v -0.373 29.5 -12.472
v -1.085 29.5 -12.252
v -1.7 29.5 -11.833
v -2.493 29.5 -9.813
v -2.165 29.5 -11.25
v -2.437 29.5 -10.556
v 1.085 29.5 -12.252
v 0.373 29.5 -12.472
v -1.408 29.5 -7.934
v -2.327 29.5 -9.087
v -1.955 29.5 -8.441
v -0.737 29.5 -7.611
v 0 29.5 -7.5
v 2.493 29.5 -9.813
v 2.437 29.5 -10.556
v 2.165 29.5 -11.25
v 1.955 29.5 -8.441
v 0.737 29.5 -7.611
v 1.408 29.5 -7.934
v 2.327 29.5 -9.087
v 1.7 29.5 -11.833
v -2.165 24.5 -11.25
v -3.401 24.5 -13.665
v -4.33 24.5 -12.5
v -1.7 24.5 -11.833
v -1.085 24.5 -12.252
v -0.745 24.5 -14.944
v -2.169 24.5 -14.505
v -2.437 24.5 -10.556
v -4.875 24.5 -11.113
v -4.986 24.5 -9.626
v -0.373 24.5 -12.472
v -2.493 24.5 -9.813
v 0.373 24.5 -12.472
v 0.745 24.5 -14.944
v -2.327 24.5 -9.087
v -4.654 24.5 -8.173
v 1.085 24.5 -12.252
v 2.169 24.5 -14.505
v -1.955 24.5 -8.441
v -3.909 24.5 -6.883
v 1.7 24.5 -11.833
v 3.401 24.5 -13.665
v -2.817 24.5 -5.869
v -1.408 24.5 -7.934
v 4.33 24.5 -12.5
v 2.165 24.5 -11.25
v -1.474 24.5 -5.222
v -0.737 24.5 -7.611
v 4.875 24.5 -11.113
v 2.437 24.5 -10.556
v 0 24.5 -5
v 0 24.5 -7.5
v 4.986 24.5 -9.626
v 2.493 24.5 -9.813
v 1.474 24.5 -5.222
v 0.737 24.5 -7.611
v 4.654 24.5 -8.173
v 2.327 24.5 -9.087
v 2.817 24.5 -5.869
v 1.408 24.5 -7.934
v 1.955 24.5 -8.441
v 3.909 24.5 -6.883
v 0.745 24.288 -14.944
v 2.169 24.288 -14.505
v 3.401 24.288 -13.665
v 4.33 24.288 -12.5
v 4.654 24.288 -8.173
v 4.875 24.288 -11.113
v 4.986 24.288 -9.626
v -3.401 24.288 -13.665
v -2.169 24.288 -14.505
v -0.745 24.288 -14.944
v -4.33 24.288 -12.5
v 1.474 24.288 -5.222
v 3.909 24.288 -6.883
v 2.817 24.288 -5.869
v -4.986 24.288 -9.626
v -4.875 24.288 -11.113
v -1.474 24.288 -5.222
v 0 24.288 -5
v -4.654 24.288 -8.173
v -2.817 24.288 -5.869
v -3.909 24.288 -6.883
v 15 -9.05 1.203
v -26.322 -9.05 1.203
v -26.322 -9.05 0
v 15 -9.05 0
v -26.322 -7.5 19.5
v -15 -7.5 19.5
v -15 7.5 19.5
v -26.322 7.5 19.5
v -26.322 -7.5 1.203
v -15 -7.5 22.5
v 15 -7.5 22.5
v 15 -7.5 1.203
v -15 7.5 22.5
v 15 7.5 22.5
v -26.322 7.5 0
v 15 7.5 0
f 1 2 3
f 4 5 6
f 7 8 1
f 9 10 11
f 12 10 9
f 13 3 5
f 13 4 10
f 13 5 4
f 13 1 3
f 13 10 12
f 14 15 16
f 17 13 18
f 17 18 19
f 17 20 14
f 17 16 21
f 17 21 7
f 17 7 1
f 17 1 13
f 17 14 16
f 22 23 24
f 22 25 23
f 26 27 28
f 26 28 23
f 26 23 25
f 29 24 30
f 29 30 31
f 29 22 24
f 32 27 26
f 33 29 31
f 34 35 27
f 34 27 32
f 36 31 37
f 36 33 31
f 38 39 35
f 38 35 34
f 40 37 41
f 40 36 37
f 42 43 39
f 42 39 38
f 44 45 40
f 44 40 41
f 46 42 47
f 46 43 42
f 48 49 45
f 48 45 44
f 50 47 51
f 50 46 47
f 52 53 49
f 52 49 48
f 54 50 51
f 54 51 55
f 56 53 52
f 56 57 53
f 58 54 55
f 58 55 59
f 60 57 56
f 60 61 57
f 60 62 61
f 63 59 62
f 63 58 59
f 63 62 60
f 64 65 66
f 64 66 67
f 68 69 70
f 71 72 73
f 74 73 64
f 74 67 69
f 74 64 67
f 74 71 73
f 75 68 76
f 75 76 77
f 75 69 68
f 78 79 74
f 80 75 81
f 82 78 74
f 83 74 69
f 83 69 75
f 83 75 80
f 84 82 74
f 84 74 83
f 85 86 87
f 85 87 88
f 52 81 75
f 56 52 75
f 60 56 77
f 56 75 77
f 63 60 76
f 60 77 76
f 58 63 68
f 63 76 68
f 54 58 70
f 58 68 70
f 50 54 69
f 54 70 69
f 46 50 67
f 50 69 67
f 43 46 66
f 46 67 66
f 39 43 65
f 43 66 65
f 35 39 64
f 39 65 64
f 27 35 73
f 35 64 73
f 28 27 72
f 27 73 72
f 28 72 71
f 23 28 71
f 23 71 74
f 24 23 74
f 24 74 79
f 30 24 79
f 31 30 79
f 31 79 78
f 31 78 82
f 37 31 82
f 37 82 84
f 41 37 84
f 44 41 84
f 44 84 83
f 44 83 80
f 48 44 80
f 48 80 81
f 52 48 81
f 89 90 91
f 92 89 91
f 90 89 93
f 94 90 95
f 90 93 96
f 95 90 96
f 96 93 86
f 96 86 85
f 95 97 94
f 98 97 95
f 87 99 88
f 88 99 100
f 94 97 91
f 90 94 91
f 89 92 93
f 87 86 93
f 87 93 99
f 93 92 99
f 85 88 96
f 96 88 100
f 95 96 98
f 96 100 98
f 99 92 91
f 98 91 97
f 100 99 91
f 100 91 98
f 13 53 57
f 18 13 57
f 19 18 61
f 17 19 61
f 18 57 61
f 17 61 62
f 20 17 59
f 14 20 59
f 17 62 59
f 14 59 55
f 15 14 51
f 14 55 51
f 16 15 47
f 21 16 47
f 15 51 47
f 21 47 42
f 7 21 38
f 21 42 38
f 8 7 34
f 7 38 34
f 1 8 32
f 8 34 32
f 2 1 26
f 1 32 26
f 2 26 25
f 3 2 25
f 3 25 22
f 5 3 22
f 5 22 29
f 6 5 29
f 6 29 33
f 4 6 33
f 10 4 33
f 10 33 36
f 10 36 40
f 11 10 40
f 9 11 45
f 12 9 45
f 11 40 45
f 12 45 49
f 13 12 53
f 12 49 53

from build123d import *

# Parameters (mm, degrees)
CROQUIS1_W              = 30
CROQUIS1_H              = 45
SALIENTE_EXTRUIR1_DEPTH = 7.5
CROQUIS2_W              = 20
CROQUIS2_H              = 15
SALIENTE_EXTRUIR2_DEPTH = 15
CROQUIS3_W              = 20
CROQUIS3_H              = 15
SALIENTE_EXTRUIR3_DEPTH = 8
CROQUIS4_R              = 5
SALIENTE_EXTRUIR4_DEPTH = 2
CROQUIS5_R              = 2.5
SALIENTE_EXTRUIR5_DEPTH = 5
CROQUIS6_W              = 19.5
CROQUIS6_H              = 15
SALIENTE_EXTRUIR6_DEPTH = 16
CROQUIS7_W              = 46
CROQUIS7_H              = 1.203222492
SALIENTE_EXTRUIR7_DEPTH = 1.55
CROQUIS9_W              = 23.595920382
CROQUIS9_H              = 45.94478853
CORTAR_EXTRUIR1_DEPTH   = 41.55
CROQUIS10_W             = 4.677949999
CROQUIS10_H             = 19.5
CORTAR_EXTRUIR2_DEPTH   = 20


with BuildPart() as part:
    # Croquis1 → Saliente-Extruir1 (new, symmetric)
    with BuildSketch(Plane(origin=(0, 0, 0), x_dir=(1, 0, 0), z_dir=(0, 1, 0))):
        Rectangle(CROQUIS1_W, CROQUIS1_H)
    extrude(amount=SALIENTE_EXTRUIR1_DEPTH, both=True)

    # Croquis2 → Saliente-Extruir2 (add)
    with BuildSketch(Plane(origin=(0, 7.5, 0), x_dir=(1, 0, 0), z_dir=(0, 1, 0))):
        with Locations((0, 10)):
            Rectangle(CROQUIS2_W, CROQUIS2_H)
    extrude(amount=SALIENTE_EXTRUIR2_DEPTH)

    # Croquis3 → Saliente-Extruir3 (add)
    with BuildSketch(Plane.XZ.offset(7.5)):
        with Locations((0, -10)):
            Rectangle(CROQUIS3_W, CROQUIS3_H)
    extrude(amount=SALIENTE_EXTRUIR3_DEPTH)

    # Croquis4 → Saliente-Extruir4 (add)
    with BuildSketch(Plane(origin=(0, 22.5, 0), x_dir=(1, 0, 0), z_dir=(0, 1, 0))):
        with Locations(Location((0, 10, 0), (0, 0, 270))):
            Circle(CROQUIS4_R)
    extrude(amount=SALIENTE_EXTRUIR4_DEPTH)

    # Croquis5 → Saliente-Extruir5 (add)
    with BuildSketch(Plane(origin=(0, 24.5, 0), x_dir=(1, 0, 0), z_dir=(0, 1, 0))):
        with Locations(Location((0, 10, 0), (0, 0, 270))):
            Circle(CROQUIS5_R)
    extrude(amount=SALIENTE_EXTRUIR5_DEPTH)

    # Croquis6 → Saliente-Extruir6 (add)
    with BuildSketch(Plane.ZY.offset(15)):
        with Locations((9.75, 0)):
            Rectangle(CROQUIS6_W, CROQUIS6_H)
    extrude(amount=SALIENTE_EXTRUIR6_DEPTH)

    # Croquis7 → Saliente-Extruir7 (add)
    with BuildSketch(Plane.XZ.offset(7.5)):
        with Locations((-8, 0.601611246)):
            Rectangle(CROQUIS7_W, CROQUIS7_H)
    extrude(amount=SALIENTE_EXTRUIR7_DEPTH)

    # Croquis9 → Cortar-Extruir1 (cut)
    with BuildSketch(Plane.ZY.offset(15)):
        with Locations((-11.797960191, 1.315469515)):
            Rectangle(CROQUIS9_W, CROQUIS9_H)
    extrude(amount=-CORTAR_EXTRUIR1_DEPTH, mode=Mode.SUBTRACT)


with BuildPart() as cortar_extruir1_piece_1:
    # of the separate pieces the step leaves, piece 1, a body of its own (cortar_extruir1_pieces)
    add(part.part.solids().sort_by_distance((-31, 7.5, 0))[0])

    # Croquis10 → Cortar-Extruir2 (cut)
    with BuildSketch(Plane(origin=(0, 7.5, 0), x_dir=(1, 0, 0), z_dir=(0, 1, 0))):
        with Locations((-28.661025001, -9.75)):
            Rectangle(CROQUIS10_W, CROQUIS10_H)
    extrude(amount=-CORTAR_EXTRUIR2_DEPTH, mode=Mode.SUBTRACT)


with BuildPart() as cortar_extruir1_piece_2:
    # of the separate pieces the step leaves, piece 2, a body of its own (cortar_extruir1_pieces)
    add(part.part.solids().sort_by_distance((0, 24.28786378, -5))[0])


solid = Compound([cortar_extruir1_piece_1.part, cortar_extruir1_piece_2.part])
